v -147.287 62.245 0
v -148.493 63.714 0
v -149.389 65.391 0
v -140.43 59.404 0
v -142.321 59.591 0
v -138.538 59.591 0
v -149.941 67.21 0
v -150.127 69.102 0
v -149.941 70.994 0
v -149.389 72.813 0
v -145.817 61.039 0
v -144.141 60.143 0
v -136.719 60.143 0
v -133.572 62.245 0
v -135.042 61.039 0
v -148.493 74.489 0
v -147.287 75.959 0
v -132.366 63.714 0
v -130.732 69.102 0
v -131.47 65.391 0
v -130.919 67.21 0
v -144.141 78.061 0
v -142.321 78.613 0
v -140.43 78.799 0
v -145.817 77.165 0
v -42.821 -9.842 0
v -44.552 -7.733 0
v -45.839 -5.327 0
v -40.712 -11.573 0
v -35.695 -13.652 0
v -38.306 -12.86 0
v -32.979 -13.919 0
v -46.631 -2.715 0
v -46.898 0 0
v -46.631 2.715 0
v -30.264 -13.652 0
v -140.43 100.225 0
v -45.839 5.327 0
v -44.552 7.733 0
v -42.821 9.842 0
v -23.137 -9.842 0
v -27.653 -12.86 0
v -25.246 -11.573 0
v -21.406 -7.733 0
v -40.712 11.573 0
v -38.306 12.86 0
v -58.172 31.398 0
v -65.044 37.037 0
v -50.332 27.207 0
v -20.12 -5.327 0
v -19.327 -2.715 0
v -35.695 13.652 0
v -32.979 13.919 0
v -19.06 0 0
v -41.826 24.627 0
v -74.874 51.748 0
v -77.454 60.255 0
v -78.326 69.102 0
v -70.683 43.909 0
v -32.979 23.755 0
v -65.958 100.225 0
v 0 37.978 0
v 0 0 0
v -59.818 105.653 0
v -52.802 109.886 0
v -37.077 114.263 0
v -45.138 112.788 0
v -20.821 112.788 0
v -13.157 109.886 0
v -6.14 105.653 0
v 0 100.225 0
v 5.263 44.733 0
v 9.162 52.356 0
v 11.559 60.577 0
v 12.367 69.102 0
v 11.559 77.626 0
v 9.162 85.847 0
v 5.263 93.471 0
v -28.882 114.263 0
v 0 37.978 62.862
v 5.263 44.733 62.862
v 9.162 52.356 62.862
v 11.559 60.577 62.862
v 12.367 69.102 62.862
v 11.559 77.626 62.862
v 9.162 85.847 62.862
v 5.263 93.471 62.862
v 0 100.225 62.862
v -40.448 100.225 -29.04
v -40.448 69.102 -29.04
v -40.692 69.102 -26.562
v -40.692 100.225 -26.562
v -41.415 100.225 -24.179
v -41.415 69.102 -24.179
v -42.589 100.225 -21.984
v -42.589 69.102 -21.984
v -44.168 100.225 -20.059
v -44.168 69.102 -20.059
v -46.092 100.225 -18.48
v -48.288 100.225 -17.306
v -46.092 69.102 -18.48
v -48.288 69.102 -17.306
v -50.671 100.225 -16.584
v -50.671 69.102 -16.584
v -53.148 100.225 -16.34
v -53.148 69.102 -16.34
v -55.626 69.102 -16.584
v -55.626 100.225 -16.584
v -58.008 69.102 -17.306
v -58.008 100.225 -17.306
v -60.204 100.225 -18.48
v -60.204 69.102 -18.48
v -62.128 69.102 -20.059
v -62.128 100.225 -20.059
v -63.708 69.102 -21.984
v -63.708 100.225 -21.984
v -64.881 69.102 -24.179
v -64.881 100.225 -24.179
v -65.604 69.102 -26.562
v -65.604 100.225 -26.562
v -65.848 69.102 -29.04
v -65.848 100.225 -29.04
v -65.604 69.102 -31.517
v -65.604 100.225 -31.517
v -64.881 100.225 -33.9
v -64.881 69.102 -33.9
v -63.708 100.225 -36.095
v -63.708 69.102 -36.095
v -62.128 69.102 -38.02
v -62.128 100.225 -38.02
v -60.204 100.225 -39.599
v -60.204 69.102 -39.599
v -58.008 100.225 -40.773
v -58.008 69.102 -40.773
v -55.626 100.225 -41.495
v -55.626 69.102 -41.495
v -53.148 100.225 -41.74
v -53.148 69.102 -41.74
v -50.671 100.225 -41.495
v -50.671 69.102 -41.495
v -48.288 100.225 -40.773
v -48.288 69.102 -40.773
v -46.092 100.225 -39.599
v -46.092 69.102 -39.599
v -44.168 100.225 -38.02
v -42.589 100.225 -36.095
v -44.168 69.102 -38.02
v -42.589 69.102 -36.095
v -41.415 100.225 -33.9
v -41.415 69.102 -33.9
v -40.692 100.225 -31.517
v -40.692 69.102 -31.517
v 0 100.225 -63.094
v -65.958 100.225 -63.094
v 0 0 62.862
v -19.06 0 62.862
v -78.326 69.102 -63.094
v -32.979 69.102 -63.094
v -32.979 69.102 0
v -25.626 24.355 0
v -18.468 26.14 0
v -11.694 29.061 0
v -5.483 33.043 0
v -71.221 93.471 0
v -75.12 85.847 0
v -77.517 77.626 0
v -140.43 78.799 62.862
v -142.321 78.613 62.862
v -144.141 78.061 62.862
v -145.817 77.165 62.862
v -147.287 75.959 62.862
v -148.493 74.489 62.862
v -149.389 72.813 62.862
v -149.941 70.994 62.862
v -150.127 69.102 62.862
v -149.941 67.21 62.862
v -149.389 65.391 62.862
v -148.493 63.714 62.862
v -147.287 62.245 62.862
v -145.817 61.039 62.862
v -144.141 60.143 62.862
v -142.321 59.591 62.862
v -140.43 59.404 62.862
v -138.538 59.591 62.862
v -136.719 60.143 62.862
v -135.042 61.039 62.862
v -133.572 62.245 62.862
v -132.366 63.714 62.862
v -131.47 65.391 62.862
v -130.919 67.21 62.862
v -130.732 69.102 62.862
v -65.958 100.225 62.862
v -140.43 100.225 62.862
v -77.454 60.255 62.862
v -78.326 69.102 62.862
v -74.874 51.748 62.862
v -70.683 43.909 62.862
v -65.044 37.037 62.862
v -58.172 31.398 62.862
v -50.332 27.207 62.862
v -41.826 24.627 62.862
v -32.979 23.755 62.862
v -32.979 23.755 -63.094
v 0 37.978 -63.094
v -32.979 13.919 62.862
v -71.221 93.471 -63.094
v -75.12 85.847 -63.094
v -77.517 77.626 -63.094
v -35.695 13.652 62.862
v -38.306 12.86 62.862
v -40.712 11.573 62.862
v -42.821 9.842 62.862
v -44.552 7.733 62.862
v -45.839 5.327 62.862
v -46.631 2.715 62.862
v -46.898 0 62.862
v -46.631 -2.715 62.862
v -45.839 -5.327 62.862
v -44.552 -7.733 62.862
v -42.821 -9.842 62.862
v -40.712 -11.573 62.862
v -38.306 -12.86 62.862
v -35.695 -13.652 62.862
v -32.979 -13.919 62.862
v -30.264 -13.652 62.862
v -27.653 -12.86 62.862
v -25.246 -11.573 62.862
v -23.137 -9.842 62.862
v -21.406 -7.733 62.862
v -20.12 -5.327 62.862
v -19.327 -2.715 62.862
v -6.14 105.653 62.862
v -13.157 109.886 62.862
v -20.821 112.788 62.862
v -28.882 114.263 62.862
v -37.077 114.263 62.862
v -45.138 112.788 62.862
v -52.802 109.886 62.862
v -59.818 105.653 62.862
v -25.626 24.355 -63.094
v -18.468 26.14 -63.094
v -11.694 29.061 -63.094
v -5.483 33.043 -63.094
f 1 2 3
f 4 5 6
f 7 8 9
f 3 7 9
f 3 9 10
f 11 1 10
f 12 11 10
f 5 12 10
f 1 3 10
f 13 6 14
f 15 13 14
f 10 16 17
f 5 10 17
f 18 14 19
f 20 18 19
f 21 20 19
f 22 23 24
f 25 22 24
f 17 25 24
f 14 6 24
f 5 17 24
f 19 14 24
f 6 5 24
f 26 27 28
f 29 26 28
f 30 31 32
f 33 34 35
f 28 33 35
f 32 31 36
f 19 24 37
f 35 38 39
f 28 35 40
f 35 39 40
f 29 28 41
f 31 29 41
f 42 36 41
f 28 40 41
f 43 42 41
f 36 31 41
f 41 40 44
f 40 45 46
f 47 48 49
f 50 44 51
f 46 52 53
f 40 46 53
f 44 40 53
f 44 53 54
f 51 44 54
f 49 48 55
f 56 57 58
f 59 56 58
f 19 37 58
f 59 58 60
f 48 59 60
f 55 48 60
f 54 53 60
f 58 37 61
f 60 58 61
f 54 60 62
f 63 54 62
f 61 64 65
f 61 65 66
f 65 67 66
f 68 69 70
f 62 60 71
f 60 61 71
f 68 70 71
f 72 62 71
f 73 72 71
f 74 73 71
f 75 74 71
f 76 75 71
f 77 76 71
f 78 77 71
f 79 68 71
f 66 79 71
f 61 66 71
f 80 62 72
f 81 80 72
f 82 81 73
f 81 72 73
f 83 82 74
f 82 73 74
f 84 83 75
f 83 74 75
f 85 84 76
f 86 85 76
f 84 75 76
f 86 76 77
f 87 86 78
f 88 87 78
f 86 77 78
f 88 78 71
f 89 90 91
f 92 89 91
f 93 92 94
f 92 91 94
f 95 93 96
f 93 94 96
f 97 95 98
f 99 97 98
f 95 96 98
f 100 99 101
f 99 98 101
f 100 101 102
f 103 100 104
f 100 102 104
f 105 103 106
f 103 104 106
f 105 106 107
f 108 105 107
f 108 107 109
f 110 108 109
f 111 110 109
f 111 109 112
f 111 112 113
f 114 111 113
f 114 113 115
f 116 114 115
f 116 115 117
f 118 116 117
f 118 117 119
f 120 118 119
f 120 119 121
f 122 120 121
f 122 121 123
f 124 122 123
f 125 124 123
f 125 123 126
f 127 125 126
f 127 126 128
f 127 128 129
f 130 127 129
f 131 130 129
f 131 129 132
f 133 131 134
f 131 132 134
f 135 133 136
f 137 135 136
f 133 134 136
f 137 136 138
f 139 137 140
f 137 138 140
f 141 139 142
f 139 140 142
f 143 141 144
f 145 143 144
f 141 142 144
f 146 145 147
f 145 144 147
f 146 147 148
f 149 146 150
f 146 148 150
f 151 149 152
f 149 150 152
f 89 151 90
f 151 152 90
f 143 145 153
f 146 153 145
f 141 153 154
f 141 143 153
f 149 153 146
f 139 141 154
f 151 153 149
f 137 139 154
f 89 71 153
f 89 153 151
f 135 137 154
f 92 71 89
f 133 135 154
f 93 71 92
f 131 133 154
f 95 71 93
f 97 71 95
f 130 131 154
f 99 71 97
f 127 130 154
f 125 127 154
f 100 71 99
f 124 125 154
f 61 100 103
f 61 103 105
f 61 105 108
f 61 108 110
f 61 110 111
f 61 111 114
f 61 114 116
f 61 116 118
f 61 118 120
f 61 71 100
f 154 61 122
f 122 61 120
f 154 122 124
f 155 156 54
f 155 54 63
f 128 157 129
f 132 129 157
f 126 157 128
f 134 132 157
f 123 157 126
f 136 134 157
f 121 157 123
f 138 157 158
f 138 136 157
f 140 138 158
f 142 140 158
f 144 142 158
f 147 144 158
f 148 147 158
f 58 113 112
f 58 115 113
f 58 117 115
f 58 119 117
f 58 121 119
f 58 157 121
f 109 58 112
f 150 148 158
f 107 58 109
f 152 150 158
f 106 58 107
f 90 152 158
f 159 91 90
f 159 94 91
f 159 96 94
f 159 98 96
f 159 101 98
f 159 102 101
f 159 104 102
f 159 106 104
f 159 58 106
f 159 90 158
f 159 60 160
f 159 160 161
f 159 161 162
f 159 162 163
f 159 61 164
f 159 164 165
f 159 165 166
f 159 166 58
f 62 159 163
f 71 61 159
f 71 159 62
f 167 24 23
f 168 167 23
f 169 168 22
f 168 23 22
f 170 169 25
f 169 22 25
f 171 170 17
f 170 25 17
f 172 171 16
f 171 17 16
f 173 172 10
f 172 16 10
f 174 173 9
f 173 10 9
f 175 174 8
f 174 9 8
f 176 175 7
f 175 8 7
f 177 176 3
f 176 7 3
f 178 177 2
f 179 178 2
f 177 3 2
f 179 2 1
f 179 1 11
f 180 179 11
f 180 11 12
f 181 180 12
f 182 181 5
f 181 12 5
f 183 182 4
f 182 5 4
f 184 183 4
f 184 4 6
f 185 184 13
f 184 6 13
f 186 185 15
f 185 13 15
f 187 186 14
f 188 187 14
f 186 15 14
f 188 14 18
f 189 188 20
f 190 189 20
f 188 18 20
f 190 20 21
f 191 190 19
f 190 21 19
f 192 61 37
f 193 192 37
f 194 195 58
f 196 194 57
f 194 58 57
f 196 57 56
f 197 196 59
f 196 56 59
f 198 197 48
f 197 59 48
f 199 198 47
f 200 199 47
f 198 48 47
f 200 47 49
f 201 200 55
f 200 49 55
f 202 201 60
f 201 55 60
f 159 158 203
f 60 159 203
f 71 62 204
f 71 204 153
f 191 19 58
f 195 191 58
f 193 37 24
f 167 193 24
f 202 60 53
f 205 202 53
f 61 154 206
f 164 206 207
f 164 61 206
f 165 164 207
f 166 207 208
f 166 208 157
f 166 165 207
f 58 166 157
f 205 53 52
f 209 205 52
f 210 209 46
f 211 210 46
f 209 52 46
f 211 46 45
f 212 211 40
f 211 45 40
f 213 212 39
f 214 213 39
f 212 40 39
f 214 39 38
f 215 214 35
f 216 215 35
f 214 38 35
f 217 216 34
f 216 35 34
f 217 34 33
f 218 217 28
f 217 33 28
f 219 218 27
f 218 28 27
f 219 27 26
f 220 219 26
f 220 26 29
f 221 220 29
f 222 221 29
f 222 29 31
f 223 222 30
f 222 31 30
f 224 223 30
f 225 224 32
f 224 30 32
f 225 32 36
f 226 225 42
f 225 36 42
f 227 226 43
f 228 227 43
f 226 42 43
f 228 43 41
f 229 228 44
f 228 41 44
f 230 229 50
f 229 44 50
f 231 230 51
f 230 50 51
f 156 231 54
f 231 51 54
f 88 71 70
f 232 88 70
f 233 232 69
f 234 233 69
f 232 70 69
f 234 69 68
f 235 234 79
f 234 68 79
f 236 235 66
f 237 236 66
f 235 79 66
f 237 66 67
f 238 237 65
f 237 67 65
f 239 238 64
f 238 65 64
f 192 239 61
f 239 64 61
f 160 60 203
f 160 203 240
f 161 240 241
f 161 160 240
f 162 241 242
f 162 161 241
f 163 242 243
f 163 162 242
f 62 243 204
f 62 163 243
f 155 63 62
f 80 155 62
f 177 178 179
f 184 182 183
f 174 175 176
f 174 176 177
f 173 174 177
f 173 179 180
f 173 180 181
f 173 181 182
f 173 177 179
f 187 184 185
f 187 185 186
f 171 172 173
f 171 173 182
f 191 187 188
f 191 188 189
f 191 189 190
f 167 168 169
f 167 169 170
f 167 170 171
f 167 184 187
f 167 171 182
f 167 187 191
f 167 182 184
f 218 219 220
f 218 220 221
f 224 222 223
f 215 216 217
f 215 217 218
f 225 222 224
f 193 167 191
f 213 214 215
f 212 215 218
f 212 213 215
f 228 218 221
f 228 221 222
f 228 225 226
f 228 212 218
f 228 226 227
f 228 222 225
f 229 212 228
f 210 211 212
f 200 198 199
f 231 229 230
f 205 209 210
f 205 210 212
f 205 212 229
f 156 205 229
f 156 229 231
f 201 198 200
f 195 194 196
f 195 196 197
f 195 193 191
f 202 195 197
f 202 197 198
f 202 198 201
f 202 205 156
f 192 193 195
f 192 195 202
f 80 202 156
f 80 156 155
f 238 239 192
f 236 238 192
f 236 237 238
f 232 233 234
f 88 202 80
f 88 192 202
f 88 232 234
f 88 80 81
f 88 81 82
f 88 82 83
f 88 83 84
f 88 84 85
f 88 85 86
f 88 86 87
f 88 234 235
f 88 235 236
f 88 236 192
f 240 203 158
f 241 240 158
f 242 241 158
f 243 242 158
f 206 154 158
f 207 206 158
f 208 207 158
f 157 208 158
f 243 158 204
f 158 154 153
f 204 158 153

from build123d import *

# Parameters (mm, degrees)
F1_DEPTH = 62.86174
F2_DEPTH = 63.09395
F3_R     = 12.7
F4_DEPTH = 54.77137


with BuildPart() as f1:
    # F0 (on Top) → F1 (new body)
    with BuildSketch(Plane.XY):
        with BuildLine():
            ThreePointArc((-140.4295861721, 78.7991555305), (-147.2866867811, 62.2446502417), (-130.7321814923, 69.1017508507))
            Line((-130.7321814923, 69.1017508507), (-140.4295861721, 69.1017508507))
            Line((-140.4295861721, 69.1017508507), (-140.4295861721, 78.7991555305))
        make_face()
        with BuildLine():
            ThreePointArc((-32.9791270196, 13.9191422166), (-42.8214468693, -9.8423198497), (-19.059984803, 0))
            Line((-19.059984803, 0), (-32.9791270196, 0))
            Line((-32.9791270196, 0), (-32.9791270196, 13.9191422166))
        make_face()
        with BuildLine():
            ThreePointArc((-78.3255656545, 69.1017508507), (-65.043901281, 37.0369765893), (-32.9791270196, 23.7553122159))
            Line((-32.9791270196, 23.7553122159), (-32.9791270196, 69.1017508507))
            Line((-32.9791270196, 69.1017508507), (-78.3255656545, 69.1017508507))
        make_face()
        with BuildLine():
            Line((0, 100.2253219485), (0, 37.9781797528))
            ThreePointArc((0, 37.9781797528), (9.1622152495, 52.3564001939), (12.3673116152, 69.1017508507))
            ThreePointArc((12.3673116152, 69.1017508507), (9.1622152495, 85.8471015074), (0, 100.2253219485))
        make_face()
        with BuildLine():
            Line((-19.059984803, 0), (0, 0))
            Line((0, 0), (0, 37.9781797528))
            ThreePointArc((0, 37.9781797528), (-15.0214491356, 27.4625709611), (-32.9791270196, 23.7553122159))
            Line((-32.9791270196, 23.7553122159), (-32.9791270196, 13.9191422166))
            ThreePointArc((-32.9791270196, 13.9191422166), (-23.13680717, 9.8423198497), (-19.059984803, 0))
        make_face()
        with BuildLine():
            Line((-32.9791270196, 0), (-19.059984803, 0))
            ThreePointArc((-19.059984803, 0), (-23.13680717, 9.8423198497), (-32.9791270196, 13.9191422166))
            Line((-32.9791270196, 13.9191422166), (-32.9791270196, 0))
        make_face()
        with BuildLine():
            ThreePointArc((-78.3255656545, 69.1017508507), (-75.1204692888, 85.8471015074), (-65.9582540393, 100.2253219485))
            Line((-65.9582540393, 100.2253219485), (-140.4295861721, 100.2253219485))
            Line((-140.4295861721, 100.2253219485), (-140.4295861721, 78.7991555305))
            ThreePointArc((-140.4295861721, 78.7991555305), (-133.5724855631, 75.9588514597), (-130.7321814923, 69.1017508507))
            Line((-130.7321814923, 69.1017508507), (-78.3255656545, 69.1017508507))
        make_face()
        with BuildLine():
            Line((-140.4295861721, 69.1017508507), (-130.7321814923, 69.1017508507))
            ThreePointArc((-130.7321814923, 69.1017508507), (-133.5724855631, 75.9588514597), (-140.4295861721, 78.7991555305))
            Line((-140.4295861721, 78.7991555305), (-140.4295861721, 69.1017508507))
        make_face()
        with BuildLine():
            ThreePointArc((-32.9791270196, 23.7553122159), (-15.0214491356, 27.4625709611), (0, 37.9781797528))
            Line((0, 37.9781797528), (0, 100.2253219485))
            Line((0, 100.2253219485), (-65.9582540393, 100.2253219485))
            ThreePointArc((-65.9582540393, 100.2253219485), (-75.1204692888, 85.8471015074), (-78.3255656545, 69.1017508507))
            Line((-78.3255656545, 69.1017508507), (-32.9791270196, 69.1017508507))
            Line((-32.9791270196, 69.1017508507), (-32.9791270196, 23.7553122159))
        make_face()
        with BuildLine():
            Line((-65.9582540393, 100.2253219485), (0, 100.2253219485))
            ThreePointArc((0, 100.2253219485), (-32.9791270196, 114.4481894855), (-65.9582540393, 100.2253219485))
        make_face()
    extrude(amount=F1_DEPTH)


with BuildPart() as f2:
    # F0 (on Top) → F2 (new body)
    with BuildSketch(Plane.XY):
        with BuildLine():
            ThreePointArc((-32.9791270196, 23.7553122159), (-15.0214491356, 27.4625709611), (0, 37.9781797528))
            Line((0, 37.9781797528), (0, 100.2253219485))
            Line((0, 100.2253219485), (-65.9582540393, 100.2253219485))
            ThreePointArc((-65.9582540393, 100.2253219485), (-75.1204692888, 85.8471015074), (-78.3255656545, 69.1017508507))
            Line((-78.3255656545, 69.1017508507), (-32.9791270196, 69.1017508507))
            Line((-32.9791270196, 69.1017508507), (-32.9791270196, 23.7553122159))
        make_face()
    extrude(amount=-F2_DEPTH)

    # F3 (on face) → F4 (cut)
    with BuildSketch(Plane.XZ.offset(-69.1017508507)):
        with Locations((-53.148225101, -29.0395207848)):
            Circle(F3_R)
    extrude(amount=-F4_DEPTH, mode=Mode.SUBTRACT)


solid = Compound([f1.part, f2.part])
